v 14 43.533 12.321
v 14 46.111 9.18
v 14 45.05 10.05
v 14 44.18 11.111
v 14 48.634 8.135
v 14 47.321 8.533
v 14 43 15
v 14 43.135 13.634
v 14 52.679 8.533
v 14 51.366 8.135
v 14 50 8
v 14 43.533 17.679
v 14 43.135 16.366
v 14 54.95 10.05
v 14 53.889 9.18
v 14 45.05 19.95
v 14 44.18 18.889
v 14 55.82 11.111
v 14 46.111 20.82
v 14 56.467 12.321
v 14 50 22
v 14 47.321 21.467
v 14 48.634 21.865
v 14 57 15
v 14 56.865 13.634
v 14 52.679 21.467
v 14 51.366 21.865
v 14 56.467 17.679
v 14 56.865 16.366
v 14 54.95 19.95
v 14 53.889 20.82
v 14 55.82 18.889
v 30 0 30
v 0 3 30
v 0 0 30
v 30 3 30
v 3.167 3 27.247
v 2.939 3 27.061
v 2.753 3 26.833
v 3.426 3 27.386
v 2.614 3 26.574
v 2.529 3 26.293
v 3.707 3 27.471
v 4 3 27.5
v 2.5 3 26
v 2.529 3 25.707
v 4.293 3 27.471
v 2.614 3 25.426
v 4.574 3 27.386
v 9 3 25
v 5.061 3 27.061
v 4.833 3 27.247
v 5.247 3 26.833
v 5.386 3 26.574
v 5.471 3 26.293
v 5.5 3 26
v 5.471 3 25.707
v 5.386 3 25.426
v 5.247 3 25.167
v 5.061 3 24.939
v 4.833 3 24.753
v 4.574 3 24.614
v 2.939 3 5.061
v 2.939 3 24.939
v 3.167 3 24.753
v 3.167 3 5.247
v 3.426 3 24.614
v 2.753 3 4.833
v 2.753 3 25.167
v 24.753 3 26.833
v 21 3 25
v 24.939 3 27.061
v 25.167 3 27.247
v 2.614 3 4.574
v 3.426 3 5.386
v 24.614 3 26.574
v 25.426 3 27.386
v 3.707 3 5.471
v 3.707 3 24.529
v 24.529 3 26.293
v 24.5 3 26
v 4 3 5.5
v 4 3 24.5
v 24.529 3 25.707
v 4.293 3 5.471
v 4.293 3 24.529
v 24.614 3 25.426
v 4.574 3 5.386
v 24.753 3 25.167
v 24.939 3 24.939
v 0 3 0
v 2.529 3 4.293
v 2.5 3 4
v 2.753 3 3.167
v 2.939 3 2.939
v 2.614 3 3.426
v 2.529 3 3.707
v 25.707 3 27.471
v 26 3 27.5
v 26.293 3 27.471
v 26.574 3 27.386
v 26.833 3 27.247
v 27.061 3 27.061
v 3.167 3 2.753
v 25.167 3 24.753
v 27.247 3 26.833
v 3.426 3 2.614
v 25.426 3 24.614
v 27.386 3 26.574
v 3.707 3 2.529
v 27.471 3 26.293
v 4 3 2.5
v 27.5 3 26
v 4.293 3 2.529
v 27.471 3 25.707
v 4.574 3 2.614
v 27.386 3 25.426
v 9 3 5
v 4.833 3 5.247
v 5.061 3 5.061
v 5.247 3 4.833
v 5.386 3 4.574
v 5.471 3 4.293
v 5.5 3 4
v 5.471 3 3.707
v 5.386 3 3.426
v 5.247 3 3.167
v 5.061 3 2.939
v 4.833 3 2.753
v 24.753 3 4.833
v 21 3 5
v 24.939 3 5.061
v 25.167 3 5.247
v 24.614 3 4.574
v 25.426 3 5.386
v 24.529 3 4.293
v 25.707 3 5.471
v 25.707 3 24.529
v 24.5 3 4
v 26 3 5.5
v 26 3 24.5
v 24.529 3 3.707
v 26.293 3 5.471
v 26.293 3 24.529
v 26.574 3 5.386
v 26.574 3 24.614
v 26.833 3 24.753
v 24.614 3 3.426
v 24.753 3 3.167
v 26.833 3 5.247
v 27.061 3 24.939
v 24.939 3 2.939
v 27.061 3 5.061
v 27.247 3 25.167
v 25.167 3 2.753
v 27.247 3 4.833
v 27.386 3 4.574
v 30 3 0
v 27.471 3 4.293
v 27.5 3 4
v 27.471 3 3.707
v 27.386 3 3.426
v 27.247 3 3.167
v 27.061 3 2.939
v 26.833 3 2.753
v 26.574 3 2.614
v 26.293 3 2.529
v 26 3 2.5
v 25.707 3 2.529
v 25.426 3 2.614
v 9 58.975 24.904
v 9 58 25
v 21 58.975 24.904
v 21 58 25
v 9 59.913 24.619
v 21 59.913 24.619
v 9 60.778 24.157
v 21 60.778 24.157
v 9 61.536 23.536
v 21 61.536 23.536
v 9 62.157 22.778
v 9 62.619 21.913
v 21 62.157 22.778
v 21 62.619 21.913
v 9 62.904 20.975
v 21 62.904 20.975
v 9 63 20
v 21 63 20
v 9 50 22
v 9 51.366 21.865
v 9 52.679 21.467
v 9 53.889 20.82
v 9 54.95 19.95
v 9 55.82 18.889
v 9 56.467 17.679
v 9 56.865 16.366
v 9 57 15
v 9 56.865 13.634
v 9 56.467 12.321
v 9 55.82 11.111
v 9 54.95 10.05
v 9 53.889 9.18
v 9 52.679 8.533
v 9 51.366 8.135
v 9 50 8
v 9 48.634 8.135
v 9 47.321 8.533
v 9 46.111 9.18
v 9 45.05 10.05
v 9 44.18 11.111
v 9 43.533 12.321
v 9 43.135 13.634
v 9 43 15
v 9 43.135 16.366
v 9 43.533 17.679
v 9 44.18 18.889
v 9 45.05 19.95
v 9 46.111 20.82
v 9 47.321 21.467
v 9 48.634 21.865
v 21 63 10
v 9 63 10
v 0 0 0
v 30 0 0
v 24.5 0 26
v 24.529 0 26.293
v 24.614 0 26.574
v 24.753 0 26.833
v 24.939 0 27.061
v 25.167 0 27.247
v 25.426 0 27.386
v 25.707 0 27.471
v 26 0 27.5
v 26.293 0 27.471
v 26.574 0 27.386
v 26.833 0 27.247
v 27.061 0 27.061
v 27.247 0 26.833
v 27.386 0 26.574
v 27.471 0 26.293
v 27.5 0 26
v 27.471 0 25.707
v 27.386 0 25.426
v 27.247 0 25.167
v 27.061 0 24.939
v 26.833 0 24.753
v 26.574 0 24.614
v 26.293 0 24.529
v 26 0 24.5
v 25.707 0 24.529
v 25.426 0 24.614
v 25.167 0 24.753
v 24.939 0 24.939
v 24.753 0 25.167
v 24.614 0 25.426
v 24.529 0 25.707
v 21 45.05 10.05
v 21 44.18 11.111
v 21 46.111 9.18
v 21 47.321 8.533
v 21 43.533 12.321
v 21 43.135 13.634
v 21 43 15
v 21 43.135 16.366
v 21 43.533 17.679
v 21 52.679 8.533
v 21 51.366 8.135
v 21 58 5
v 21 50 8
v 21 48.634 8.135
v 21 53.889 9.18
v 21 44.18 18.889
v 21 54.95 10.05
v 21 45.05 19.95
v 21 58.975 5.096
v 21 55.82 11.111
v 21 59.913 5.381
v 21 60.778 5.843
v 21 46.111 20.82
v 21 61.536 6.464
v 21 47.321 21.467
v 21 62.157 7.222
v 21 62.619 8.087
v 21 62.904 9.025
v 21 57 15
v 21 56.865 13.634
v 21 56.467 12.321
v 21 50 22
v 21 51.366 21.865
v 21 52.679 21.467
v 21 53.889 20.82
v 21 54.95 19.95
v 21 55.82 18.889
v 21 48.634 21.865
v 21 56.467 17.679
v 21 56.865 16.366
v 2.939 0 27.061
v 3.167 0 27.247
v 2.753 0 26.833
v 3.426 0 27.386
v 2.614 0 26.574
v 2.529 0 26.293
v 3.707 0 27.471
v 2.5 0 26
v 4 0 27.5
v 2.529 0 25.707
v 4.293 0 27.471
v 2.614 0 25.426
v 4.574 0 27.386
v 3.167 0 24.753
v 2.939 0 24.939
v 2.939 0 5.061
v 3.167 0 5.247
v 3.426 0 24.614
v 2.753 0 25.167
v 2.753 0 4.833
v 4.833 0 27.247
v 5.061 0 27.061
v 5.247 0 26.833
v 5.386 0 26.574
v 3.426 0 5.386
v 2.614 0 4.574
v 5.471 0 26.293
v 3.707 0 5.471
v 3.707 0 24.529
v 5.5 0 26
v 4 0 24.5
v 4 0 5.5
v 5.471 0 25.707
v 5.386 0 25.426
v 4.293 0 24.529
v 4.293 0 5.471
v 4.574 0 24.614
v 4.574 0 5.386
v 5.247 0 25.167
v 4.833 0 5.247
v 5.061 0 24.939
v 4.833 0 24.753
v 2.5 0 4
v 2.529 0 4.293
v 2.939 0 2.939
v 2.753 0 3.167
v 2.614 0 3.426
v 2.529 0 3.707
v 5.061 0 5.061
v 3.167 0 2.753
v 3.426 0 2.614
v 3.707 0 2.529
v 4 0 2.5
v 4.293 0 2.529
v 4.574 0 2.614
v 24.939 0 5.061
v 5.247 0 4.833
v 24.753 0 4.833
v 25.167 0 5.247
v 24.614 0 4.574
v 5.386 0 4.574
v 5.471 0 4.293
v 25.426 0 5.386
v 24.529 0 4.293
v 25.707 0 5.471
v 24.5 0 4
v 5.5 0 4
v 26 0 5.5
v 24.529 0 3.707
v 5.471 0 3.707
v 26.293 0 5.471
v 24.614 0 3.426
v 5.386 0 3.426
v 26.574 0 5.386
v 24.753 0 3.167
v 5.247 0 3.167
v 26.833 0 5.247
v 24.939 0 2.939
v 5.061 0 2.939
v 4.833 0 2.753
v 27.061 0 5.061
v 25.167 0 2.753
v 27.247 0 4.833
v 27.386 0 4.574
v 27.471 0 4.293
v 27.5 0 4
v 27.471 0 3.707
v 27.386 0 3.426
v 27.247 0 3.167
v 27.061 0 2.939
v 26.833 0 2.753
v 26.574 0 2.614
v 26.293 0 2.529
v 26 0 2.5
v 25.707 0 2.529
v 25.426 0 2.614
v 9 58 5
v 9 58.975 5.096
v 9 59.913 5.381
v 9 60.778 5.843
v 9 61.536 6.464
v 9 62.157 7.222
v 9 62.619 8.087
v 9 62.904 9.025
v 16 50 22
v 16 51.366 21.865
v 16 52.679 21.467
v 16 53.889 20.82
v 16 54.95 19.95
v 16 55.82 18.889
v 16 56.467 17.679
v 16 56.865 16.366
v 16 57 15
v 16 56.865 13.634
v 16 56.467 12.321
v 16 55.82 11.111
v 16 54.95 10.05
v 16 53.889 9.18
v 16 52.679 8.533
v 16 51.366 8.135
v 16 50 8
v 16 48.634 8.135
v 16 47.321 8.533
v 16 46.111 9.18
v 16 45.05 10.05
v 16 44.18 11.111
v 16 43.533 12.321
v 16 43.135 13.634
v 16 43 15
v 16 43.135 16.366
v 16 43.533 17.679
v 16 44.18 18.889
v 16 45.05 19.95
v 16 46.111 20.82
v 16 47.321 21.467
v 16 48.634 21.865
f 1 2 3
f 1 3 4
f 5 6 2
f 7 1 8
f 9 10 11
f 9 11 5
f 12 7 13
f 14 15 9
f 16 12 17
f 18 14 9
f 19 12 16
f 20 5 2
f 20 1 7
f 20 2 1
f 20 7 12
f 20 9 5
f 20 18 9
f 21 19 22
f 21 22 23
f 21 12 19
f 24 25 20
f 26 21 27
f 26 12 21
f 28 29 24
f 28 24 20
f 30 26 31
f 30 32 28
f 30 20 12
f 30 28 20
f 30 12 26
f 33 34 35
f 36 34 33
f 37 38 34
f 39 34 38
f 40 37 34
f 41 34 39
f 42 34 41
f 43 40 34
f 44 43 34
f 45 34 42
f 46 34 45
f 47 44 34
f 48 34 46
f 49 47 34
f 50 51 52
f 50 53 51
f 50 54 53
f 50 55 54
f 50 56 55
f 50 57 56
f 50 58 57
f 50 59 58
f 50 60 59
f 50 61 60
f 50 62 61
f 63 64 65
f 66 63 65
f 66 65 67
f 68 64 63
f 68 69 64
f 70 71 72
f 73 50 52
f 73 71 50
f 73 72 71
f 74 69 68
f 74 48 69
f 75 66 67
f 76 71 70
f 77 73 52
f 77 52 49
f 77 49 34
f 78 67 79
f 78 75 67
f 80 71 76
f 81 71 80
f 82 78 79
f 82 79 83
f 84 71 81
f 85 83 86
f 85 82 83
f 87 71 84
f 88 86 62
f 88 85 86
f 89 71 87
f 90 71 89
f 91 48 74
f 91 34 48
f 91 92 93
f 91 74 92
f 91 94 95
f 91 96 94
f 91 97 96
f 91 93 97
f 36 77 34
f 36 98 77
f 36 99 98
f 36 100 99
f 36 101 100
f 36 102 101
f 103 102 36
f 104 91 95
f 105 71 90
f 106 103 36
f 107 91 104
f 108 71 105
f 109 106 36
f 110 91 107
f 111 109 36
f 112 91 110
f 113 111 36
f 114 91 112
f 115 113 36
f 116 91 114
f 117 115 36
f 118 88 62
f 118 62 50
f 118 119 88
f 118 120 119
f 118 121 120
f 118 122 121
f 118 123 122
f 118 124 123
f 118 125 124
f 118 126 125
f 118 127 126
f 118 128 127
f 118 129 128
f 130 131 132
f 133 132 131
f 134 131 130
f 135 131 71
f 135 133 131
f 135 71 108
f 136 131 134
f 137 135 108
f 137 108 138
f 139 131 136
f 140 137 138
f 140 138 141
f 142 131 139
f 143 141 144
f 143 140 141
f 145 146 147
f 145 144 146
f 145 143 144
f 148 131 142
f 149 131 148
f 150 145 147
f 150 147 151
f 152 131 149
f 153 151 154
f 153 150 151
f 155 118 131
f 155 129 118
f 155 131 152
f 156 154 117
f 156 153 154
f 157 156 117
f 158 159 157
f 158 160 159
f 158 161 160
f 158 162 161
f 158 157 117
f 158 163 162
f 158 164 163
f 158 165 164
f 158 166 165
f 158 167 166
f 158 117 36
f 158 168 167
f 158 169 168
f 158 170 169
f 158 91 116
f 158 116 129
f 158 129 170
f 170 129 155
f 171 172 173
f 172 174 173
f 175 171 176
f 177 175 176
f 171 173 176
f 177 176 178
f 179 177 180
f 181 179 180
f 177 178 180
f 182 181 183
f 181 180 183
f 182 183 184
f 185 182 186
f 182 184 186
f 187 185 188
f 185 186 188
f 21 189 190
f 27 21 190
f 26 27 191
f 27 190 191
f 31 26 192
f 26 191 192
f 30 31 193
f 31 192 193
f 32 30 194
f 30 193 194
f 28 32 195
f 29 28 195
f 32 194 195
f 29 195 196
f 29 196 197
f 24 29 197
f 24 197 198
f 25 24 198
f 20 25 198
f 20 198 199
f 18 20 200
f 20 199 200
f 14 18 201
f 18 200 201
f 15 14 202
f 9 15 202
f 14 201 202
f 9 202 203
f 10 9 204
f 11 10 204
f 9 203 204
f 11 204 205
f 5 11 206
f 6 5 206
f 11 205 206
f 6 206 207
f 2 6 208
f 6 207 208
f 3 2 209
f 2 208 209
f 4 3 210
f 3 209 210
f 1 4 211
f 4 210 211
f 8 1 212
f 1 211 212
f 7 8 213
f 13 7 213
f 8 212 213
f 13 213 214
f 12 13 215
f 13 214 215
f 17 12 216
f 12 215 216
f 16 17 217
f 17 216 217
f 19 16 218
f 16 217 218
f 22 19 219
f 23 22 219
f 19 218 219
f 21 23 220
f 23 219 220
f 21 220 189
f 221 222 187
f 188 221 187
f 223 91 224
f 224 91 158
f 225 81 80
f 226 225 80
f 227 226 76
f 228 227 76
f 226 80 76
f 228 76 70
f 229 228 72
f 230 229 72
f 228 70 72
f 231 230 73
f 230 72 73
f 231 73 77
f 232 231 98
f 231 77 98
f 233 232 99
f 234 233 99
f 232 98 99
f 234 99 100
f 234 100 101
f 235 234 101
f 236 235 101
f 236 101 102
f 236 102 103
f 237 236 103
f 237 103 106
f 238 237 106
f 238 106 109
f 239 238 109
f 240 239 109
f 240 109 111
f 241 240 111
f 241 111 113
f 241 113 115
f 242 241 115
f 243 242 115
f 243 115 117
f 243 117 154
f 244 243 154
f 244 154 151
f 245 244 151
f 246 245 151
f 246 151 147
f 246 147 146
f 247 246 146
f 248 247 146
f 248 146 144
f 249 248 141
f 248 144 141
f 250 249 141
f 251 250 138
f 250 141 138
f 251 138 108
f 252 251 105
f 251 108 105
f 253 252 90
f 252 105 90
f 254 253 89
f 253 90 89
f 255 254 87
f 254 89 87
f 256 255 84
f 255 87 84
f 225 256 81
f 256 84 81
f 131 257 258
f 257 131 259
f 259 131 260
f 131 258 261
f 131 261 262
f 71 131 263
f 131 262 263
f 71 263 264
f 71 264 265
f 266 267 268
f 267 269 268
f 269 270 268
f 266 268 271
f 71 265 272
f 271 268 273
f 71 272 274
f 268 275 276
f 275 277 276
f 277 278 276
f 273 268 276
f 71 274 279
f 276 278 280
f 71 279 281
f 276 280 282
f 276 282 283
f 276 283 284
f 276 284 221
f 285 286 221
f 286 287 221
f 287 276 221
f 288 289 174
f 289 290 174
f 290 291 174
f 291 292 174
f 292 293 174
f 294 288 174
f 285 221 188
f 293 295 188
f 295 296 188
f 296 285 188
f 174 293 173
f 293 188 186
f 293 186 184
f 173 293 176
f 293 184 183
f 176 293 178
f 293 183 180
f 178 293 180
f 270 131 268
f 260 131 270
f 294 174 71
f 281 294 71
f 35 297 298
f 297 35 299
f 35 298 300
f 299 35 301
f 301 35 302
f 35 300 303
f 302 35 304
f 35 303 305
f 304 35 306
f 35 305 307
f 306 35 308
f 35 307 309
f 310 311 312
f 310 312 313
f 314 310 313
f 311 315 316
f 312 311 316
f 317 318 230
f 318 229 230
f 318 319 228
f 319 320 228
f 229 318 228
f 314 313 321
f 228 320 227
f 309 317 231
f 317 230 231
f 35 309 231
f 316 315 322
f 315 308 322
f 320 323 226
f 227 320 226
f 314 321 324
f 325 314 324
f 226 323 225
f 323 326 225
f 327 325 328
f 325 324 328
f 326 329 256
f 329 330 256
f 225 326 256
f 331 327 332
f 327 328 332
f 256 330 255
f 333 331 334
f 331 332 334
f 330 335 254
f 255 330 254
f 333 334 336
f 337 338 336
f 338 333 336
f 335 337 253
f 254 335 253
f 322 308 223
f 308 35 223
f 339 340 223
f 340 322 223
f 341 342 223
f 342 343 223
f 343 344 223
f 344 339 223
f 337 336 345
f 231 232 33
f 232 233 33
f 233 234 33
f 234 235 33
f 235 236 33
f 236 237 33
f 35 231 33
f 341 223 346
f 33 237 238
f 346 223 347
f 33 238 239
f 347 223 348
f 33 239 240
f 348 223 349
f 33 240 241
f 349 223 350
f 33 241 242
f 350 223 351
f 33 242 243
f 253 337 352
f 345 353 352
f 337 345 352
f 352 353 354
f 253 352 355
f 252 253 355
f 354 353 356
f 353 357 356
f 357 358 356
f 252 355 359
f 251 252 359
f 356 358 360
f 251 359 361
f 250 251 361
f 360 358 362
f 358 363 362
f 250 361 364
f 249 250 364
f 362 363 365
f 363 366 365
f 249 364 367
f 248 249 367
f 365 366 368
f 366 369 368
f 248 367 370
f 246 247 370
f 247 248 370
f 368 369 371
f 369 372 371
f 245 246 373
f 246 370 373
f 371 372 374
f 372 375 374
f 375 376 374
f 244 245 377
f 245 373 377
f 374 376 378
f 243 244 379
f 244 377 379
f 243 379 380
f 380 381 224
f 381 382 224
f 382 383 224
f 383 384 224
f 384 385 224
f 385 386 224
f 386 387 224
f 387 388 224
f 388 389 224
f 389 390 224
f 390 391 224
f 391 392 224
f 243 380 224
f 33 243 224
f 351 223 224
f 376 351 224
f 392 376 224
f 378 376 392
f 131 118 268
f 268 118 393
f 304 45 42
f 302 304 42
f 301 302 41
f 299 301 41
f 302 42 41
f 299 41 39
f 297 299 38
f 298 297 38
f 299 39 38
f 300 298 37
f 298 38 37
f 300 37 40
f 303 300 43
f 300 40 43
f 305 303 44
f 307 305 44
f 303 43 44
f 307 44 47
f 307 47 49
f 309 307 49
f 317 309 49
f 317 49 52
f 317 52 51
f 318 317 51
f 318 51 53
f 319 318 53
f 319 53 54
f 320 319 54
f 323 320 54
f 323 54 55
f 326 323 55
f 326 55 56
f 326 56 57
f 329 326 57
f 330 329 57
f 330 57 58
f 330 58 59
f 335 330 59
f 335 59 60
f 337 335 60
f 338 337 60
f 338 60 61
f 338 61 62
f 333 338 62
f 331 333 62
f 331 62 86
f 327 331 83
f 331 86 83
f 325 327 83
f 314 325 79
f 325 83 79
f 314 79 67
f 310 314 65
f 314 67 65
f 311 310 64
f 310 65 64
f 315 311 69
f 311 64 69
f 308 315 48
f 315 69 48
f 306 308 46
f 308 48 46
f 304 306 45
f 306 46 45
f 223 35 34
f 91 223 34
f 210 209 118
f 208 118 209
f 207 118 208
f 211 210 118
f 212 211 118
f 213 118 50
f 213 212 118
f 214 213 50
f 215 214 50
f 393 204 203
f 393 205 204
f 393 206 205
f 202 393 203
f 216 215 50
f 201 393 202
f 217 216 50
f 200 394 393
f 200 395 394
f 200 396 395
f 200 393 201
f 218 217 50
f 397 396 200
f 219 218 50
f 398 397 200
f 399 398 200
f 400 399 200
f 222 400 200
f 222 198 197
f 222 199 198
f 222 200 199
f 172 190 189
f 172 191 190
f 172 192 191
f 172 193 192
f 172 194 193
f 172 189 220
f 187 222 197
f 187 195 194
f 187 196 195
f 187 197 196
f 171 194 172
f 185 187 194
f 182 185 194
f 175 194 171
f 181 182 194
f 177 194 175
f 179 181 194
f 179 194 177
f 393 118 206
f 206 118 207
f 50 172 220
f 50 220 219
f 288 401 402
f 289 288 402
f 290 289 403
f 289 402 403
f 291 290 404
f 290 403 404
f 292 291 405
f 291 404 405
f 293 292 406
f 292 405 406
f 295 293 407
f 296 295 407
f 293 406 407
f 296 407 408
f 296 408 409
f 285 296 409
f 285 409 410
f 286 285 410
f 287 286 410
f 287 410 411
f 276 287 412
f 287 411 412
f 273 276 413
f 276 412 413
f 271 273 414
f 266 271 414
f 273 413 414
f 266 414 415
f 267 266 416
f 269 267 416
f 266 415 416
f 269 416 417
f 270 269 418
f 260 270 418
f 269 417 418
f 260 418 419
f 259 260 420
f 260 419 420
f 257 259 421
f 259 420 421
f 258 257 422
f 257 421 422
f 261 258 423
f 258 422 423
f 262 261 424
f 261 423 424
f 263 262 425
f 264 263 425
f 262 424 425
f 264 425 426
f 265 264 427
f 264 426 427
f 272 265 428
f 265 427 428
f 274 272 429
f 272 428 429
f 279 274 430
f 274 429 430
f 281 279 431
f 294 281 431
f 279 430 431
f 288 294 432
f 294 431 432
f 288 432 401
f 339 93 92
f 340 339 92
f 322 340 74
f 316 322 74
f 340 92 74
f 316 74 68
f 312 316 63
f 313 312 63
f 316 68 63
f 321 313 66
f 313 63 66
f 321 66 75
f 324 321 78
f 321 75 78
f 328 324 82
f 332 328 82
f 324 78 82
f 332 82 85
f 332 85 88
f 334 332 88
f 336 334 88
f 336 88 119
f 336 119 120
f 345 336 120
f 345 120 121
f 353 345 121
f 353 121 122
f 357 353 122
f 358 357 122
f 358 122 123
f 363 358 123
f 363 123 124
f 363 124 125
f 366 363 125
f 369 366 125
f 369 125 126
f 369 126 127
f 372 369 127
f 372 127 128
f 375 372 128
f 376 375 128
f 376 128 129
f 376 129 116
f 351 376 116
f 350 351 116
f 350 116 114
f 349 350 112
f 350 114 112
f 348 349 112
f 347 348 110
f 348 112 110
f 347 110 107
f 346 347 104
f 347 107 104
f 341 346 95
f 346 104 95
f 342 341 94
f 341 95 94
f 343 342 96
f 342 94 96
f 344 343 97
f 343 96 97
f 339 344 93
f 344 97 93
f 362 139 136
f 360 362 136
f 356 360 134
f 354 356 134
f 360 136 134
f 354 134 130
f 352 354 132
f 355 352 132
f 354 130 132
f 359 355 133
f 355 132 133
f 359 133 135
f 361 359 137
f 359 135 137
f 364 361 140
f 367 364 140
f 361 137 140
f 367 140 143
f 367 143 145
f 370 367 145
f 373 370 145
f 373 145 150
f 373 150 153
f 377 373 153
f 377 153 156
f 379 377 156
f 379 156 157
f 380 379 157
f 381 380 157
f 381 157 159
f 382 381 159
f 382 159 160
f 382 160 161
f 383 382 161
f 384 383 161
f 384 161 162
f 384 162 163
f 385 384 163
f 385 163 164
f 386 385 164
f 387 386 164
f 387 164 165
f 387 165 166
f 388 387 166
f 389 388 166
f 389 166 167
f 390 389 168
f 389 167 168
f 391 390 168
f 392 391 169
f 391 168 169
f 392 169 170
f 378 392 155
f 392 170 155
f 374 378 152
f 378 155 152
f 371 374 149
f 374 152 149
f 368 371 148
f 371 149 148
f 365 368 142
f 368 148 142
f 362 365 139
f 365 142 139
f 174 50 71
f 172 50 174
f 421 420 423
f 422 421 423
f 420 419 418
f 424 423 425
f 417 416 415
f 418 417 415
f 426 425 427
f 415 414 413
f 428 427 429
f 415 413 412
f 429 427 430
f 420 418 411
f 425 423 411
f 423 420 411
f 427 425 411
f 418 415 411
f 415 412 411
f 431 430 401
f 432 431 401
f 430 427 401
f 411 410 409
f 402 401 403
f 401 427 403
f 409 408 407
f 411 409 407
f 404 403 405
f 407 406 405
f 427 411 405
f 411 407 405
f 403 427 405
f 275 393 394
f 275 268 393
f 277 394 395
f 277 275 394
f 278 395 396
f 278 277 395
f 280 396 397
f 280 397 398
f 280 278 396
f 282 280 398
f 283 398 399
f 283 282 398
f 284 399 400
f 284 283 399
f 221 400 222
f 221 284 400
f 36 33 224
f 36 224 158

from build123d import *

# Parameters (mm, degrees)
SKETCH_4_W          = 30
SKETCH_4_H          = 3
EXTRUDE_3_DEPTH     = 30
EXTRUDE_START       = -9
SKETCH_5_W          = 20
SKETCH_5_H          = 60
EXTRUDE_4_DEPTH     = 12
SKETCH_6_R          = 7
CUT_EXTRUDE_1_DEPTH = 5
CUT_EXTRUDE_START   = -7
SKETCH_6_5_R        = 7
CUT_EXTRUDE_3_DEPTH = 5
SKETCH_7_R          = 1.5
CUT_EXTRUDE_4_DEPTH = 74.484692283
FILLET_1_R          = 5


with BuildPart() as part:
    # 草图4 → 凸台-拉伸3 (new body)
    with BuildSketch(Plane.XY):
        with Locations((15, 1.5)):
            Rectangle(SKETCH_4_W, SKETCH_4_H)
    extrude(amount=EXTRUDE_3_DEPTH)

    # 草图5 → 凸台-拉伸4 (add)
    with BuildSketch(Plane.ZY.offset(EXTRUDE_START)):
        with Locations((15, 33)):
            Rectangle(SKETCH_5_W, SKETCH_5_H)
    extrude(amount=-EXTRUDE_4_DEPTH)

    # 草图6 → 切除-拉伸1 (cut)
    with BuildSketch(Plane.ZY.offset(-9)):
        with Locations((15, 50)):
            Circle(SKETCH_6_R)
    extrude(amount=-CUT_EXTRUDE_1_DEPTH, mode=Mode.SUBTRACT)

    # 草图6<5> → 切除-拉伸3 (cut)
    with BuildSketch(Plane.ZY.offset(-9).offset(CUT_EXTRUDE_START)):
        with Locations((15, 50)):
            Circle(SKETCH_6_5_R)
    extrude(amount=-CUT_EXTRUDE_3_DEPTH, mode=Mode.SUBTRACT)

    # 草图7 → 切除-拉伸4 (cut, through all)
    with BuildSketch(Plane(origin=(0, 3, 0), x_dir=(1, 0, 0), z_dir=(0, 1, 0))):
        with Locations((4, -4)):
            Circle(SKETCH_7_R)
        with Locations((26, -4)):
            Circle(SKETCH_7_R)
        with Locations((26, -26)):
            Circle(SKETCH_7_R)
        with Locations((4, -26)):
            Circle(SKETCH_7_R)
    extrude(amount=-CUT_EXTRUDE_4_DEPTH, mode=Mode.SUBTRACT)

    # 圆角1
    fillet_1_edges = [part.edges().sort_by_distance(p)[0] for p in [
        (15, 63, 25),
        (15, 63, 5),
    ]]
    fillet(fillet_1_edges, radius=FILLET_1_R)


solid = part.part
